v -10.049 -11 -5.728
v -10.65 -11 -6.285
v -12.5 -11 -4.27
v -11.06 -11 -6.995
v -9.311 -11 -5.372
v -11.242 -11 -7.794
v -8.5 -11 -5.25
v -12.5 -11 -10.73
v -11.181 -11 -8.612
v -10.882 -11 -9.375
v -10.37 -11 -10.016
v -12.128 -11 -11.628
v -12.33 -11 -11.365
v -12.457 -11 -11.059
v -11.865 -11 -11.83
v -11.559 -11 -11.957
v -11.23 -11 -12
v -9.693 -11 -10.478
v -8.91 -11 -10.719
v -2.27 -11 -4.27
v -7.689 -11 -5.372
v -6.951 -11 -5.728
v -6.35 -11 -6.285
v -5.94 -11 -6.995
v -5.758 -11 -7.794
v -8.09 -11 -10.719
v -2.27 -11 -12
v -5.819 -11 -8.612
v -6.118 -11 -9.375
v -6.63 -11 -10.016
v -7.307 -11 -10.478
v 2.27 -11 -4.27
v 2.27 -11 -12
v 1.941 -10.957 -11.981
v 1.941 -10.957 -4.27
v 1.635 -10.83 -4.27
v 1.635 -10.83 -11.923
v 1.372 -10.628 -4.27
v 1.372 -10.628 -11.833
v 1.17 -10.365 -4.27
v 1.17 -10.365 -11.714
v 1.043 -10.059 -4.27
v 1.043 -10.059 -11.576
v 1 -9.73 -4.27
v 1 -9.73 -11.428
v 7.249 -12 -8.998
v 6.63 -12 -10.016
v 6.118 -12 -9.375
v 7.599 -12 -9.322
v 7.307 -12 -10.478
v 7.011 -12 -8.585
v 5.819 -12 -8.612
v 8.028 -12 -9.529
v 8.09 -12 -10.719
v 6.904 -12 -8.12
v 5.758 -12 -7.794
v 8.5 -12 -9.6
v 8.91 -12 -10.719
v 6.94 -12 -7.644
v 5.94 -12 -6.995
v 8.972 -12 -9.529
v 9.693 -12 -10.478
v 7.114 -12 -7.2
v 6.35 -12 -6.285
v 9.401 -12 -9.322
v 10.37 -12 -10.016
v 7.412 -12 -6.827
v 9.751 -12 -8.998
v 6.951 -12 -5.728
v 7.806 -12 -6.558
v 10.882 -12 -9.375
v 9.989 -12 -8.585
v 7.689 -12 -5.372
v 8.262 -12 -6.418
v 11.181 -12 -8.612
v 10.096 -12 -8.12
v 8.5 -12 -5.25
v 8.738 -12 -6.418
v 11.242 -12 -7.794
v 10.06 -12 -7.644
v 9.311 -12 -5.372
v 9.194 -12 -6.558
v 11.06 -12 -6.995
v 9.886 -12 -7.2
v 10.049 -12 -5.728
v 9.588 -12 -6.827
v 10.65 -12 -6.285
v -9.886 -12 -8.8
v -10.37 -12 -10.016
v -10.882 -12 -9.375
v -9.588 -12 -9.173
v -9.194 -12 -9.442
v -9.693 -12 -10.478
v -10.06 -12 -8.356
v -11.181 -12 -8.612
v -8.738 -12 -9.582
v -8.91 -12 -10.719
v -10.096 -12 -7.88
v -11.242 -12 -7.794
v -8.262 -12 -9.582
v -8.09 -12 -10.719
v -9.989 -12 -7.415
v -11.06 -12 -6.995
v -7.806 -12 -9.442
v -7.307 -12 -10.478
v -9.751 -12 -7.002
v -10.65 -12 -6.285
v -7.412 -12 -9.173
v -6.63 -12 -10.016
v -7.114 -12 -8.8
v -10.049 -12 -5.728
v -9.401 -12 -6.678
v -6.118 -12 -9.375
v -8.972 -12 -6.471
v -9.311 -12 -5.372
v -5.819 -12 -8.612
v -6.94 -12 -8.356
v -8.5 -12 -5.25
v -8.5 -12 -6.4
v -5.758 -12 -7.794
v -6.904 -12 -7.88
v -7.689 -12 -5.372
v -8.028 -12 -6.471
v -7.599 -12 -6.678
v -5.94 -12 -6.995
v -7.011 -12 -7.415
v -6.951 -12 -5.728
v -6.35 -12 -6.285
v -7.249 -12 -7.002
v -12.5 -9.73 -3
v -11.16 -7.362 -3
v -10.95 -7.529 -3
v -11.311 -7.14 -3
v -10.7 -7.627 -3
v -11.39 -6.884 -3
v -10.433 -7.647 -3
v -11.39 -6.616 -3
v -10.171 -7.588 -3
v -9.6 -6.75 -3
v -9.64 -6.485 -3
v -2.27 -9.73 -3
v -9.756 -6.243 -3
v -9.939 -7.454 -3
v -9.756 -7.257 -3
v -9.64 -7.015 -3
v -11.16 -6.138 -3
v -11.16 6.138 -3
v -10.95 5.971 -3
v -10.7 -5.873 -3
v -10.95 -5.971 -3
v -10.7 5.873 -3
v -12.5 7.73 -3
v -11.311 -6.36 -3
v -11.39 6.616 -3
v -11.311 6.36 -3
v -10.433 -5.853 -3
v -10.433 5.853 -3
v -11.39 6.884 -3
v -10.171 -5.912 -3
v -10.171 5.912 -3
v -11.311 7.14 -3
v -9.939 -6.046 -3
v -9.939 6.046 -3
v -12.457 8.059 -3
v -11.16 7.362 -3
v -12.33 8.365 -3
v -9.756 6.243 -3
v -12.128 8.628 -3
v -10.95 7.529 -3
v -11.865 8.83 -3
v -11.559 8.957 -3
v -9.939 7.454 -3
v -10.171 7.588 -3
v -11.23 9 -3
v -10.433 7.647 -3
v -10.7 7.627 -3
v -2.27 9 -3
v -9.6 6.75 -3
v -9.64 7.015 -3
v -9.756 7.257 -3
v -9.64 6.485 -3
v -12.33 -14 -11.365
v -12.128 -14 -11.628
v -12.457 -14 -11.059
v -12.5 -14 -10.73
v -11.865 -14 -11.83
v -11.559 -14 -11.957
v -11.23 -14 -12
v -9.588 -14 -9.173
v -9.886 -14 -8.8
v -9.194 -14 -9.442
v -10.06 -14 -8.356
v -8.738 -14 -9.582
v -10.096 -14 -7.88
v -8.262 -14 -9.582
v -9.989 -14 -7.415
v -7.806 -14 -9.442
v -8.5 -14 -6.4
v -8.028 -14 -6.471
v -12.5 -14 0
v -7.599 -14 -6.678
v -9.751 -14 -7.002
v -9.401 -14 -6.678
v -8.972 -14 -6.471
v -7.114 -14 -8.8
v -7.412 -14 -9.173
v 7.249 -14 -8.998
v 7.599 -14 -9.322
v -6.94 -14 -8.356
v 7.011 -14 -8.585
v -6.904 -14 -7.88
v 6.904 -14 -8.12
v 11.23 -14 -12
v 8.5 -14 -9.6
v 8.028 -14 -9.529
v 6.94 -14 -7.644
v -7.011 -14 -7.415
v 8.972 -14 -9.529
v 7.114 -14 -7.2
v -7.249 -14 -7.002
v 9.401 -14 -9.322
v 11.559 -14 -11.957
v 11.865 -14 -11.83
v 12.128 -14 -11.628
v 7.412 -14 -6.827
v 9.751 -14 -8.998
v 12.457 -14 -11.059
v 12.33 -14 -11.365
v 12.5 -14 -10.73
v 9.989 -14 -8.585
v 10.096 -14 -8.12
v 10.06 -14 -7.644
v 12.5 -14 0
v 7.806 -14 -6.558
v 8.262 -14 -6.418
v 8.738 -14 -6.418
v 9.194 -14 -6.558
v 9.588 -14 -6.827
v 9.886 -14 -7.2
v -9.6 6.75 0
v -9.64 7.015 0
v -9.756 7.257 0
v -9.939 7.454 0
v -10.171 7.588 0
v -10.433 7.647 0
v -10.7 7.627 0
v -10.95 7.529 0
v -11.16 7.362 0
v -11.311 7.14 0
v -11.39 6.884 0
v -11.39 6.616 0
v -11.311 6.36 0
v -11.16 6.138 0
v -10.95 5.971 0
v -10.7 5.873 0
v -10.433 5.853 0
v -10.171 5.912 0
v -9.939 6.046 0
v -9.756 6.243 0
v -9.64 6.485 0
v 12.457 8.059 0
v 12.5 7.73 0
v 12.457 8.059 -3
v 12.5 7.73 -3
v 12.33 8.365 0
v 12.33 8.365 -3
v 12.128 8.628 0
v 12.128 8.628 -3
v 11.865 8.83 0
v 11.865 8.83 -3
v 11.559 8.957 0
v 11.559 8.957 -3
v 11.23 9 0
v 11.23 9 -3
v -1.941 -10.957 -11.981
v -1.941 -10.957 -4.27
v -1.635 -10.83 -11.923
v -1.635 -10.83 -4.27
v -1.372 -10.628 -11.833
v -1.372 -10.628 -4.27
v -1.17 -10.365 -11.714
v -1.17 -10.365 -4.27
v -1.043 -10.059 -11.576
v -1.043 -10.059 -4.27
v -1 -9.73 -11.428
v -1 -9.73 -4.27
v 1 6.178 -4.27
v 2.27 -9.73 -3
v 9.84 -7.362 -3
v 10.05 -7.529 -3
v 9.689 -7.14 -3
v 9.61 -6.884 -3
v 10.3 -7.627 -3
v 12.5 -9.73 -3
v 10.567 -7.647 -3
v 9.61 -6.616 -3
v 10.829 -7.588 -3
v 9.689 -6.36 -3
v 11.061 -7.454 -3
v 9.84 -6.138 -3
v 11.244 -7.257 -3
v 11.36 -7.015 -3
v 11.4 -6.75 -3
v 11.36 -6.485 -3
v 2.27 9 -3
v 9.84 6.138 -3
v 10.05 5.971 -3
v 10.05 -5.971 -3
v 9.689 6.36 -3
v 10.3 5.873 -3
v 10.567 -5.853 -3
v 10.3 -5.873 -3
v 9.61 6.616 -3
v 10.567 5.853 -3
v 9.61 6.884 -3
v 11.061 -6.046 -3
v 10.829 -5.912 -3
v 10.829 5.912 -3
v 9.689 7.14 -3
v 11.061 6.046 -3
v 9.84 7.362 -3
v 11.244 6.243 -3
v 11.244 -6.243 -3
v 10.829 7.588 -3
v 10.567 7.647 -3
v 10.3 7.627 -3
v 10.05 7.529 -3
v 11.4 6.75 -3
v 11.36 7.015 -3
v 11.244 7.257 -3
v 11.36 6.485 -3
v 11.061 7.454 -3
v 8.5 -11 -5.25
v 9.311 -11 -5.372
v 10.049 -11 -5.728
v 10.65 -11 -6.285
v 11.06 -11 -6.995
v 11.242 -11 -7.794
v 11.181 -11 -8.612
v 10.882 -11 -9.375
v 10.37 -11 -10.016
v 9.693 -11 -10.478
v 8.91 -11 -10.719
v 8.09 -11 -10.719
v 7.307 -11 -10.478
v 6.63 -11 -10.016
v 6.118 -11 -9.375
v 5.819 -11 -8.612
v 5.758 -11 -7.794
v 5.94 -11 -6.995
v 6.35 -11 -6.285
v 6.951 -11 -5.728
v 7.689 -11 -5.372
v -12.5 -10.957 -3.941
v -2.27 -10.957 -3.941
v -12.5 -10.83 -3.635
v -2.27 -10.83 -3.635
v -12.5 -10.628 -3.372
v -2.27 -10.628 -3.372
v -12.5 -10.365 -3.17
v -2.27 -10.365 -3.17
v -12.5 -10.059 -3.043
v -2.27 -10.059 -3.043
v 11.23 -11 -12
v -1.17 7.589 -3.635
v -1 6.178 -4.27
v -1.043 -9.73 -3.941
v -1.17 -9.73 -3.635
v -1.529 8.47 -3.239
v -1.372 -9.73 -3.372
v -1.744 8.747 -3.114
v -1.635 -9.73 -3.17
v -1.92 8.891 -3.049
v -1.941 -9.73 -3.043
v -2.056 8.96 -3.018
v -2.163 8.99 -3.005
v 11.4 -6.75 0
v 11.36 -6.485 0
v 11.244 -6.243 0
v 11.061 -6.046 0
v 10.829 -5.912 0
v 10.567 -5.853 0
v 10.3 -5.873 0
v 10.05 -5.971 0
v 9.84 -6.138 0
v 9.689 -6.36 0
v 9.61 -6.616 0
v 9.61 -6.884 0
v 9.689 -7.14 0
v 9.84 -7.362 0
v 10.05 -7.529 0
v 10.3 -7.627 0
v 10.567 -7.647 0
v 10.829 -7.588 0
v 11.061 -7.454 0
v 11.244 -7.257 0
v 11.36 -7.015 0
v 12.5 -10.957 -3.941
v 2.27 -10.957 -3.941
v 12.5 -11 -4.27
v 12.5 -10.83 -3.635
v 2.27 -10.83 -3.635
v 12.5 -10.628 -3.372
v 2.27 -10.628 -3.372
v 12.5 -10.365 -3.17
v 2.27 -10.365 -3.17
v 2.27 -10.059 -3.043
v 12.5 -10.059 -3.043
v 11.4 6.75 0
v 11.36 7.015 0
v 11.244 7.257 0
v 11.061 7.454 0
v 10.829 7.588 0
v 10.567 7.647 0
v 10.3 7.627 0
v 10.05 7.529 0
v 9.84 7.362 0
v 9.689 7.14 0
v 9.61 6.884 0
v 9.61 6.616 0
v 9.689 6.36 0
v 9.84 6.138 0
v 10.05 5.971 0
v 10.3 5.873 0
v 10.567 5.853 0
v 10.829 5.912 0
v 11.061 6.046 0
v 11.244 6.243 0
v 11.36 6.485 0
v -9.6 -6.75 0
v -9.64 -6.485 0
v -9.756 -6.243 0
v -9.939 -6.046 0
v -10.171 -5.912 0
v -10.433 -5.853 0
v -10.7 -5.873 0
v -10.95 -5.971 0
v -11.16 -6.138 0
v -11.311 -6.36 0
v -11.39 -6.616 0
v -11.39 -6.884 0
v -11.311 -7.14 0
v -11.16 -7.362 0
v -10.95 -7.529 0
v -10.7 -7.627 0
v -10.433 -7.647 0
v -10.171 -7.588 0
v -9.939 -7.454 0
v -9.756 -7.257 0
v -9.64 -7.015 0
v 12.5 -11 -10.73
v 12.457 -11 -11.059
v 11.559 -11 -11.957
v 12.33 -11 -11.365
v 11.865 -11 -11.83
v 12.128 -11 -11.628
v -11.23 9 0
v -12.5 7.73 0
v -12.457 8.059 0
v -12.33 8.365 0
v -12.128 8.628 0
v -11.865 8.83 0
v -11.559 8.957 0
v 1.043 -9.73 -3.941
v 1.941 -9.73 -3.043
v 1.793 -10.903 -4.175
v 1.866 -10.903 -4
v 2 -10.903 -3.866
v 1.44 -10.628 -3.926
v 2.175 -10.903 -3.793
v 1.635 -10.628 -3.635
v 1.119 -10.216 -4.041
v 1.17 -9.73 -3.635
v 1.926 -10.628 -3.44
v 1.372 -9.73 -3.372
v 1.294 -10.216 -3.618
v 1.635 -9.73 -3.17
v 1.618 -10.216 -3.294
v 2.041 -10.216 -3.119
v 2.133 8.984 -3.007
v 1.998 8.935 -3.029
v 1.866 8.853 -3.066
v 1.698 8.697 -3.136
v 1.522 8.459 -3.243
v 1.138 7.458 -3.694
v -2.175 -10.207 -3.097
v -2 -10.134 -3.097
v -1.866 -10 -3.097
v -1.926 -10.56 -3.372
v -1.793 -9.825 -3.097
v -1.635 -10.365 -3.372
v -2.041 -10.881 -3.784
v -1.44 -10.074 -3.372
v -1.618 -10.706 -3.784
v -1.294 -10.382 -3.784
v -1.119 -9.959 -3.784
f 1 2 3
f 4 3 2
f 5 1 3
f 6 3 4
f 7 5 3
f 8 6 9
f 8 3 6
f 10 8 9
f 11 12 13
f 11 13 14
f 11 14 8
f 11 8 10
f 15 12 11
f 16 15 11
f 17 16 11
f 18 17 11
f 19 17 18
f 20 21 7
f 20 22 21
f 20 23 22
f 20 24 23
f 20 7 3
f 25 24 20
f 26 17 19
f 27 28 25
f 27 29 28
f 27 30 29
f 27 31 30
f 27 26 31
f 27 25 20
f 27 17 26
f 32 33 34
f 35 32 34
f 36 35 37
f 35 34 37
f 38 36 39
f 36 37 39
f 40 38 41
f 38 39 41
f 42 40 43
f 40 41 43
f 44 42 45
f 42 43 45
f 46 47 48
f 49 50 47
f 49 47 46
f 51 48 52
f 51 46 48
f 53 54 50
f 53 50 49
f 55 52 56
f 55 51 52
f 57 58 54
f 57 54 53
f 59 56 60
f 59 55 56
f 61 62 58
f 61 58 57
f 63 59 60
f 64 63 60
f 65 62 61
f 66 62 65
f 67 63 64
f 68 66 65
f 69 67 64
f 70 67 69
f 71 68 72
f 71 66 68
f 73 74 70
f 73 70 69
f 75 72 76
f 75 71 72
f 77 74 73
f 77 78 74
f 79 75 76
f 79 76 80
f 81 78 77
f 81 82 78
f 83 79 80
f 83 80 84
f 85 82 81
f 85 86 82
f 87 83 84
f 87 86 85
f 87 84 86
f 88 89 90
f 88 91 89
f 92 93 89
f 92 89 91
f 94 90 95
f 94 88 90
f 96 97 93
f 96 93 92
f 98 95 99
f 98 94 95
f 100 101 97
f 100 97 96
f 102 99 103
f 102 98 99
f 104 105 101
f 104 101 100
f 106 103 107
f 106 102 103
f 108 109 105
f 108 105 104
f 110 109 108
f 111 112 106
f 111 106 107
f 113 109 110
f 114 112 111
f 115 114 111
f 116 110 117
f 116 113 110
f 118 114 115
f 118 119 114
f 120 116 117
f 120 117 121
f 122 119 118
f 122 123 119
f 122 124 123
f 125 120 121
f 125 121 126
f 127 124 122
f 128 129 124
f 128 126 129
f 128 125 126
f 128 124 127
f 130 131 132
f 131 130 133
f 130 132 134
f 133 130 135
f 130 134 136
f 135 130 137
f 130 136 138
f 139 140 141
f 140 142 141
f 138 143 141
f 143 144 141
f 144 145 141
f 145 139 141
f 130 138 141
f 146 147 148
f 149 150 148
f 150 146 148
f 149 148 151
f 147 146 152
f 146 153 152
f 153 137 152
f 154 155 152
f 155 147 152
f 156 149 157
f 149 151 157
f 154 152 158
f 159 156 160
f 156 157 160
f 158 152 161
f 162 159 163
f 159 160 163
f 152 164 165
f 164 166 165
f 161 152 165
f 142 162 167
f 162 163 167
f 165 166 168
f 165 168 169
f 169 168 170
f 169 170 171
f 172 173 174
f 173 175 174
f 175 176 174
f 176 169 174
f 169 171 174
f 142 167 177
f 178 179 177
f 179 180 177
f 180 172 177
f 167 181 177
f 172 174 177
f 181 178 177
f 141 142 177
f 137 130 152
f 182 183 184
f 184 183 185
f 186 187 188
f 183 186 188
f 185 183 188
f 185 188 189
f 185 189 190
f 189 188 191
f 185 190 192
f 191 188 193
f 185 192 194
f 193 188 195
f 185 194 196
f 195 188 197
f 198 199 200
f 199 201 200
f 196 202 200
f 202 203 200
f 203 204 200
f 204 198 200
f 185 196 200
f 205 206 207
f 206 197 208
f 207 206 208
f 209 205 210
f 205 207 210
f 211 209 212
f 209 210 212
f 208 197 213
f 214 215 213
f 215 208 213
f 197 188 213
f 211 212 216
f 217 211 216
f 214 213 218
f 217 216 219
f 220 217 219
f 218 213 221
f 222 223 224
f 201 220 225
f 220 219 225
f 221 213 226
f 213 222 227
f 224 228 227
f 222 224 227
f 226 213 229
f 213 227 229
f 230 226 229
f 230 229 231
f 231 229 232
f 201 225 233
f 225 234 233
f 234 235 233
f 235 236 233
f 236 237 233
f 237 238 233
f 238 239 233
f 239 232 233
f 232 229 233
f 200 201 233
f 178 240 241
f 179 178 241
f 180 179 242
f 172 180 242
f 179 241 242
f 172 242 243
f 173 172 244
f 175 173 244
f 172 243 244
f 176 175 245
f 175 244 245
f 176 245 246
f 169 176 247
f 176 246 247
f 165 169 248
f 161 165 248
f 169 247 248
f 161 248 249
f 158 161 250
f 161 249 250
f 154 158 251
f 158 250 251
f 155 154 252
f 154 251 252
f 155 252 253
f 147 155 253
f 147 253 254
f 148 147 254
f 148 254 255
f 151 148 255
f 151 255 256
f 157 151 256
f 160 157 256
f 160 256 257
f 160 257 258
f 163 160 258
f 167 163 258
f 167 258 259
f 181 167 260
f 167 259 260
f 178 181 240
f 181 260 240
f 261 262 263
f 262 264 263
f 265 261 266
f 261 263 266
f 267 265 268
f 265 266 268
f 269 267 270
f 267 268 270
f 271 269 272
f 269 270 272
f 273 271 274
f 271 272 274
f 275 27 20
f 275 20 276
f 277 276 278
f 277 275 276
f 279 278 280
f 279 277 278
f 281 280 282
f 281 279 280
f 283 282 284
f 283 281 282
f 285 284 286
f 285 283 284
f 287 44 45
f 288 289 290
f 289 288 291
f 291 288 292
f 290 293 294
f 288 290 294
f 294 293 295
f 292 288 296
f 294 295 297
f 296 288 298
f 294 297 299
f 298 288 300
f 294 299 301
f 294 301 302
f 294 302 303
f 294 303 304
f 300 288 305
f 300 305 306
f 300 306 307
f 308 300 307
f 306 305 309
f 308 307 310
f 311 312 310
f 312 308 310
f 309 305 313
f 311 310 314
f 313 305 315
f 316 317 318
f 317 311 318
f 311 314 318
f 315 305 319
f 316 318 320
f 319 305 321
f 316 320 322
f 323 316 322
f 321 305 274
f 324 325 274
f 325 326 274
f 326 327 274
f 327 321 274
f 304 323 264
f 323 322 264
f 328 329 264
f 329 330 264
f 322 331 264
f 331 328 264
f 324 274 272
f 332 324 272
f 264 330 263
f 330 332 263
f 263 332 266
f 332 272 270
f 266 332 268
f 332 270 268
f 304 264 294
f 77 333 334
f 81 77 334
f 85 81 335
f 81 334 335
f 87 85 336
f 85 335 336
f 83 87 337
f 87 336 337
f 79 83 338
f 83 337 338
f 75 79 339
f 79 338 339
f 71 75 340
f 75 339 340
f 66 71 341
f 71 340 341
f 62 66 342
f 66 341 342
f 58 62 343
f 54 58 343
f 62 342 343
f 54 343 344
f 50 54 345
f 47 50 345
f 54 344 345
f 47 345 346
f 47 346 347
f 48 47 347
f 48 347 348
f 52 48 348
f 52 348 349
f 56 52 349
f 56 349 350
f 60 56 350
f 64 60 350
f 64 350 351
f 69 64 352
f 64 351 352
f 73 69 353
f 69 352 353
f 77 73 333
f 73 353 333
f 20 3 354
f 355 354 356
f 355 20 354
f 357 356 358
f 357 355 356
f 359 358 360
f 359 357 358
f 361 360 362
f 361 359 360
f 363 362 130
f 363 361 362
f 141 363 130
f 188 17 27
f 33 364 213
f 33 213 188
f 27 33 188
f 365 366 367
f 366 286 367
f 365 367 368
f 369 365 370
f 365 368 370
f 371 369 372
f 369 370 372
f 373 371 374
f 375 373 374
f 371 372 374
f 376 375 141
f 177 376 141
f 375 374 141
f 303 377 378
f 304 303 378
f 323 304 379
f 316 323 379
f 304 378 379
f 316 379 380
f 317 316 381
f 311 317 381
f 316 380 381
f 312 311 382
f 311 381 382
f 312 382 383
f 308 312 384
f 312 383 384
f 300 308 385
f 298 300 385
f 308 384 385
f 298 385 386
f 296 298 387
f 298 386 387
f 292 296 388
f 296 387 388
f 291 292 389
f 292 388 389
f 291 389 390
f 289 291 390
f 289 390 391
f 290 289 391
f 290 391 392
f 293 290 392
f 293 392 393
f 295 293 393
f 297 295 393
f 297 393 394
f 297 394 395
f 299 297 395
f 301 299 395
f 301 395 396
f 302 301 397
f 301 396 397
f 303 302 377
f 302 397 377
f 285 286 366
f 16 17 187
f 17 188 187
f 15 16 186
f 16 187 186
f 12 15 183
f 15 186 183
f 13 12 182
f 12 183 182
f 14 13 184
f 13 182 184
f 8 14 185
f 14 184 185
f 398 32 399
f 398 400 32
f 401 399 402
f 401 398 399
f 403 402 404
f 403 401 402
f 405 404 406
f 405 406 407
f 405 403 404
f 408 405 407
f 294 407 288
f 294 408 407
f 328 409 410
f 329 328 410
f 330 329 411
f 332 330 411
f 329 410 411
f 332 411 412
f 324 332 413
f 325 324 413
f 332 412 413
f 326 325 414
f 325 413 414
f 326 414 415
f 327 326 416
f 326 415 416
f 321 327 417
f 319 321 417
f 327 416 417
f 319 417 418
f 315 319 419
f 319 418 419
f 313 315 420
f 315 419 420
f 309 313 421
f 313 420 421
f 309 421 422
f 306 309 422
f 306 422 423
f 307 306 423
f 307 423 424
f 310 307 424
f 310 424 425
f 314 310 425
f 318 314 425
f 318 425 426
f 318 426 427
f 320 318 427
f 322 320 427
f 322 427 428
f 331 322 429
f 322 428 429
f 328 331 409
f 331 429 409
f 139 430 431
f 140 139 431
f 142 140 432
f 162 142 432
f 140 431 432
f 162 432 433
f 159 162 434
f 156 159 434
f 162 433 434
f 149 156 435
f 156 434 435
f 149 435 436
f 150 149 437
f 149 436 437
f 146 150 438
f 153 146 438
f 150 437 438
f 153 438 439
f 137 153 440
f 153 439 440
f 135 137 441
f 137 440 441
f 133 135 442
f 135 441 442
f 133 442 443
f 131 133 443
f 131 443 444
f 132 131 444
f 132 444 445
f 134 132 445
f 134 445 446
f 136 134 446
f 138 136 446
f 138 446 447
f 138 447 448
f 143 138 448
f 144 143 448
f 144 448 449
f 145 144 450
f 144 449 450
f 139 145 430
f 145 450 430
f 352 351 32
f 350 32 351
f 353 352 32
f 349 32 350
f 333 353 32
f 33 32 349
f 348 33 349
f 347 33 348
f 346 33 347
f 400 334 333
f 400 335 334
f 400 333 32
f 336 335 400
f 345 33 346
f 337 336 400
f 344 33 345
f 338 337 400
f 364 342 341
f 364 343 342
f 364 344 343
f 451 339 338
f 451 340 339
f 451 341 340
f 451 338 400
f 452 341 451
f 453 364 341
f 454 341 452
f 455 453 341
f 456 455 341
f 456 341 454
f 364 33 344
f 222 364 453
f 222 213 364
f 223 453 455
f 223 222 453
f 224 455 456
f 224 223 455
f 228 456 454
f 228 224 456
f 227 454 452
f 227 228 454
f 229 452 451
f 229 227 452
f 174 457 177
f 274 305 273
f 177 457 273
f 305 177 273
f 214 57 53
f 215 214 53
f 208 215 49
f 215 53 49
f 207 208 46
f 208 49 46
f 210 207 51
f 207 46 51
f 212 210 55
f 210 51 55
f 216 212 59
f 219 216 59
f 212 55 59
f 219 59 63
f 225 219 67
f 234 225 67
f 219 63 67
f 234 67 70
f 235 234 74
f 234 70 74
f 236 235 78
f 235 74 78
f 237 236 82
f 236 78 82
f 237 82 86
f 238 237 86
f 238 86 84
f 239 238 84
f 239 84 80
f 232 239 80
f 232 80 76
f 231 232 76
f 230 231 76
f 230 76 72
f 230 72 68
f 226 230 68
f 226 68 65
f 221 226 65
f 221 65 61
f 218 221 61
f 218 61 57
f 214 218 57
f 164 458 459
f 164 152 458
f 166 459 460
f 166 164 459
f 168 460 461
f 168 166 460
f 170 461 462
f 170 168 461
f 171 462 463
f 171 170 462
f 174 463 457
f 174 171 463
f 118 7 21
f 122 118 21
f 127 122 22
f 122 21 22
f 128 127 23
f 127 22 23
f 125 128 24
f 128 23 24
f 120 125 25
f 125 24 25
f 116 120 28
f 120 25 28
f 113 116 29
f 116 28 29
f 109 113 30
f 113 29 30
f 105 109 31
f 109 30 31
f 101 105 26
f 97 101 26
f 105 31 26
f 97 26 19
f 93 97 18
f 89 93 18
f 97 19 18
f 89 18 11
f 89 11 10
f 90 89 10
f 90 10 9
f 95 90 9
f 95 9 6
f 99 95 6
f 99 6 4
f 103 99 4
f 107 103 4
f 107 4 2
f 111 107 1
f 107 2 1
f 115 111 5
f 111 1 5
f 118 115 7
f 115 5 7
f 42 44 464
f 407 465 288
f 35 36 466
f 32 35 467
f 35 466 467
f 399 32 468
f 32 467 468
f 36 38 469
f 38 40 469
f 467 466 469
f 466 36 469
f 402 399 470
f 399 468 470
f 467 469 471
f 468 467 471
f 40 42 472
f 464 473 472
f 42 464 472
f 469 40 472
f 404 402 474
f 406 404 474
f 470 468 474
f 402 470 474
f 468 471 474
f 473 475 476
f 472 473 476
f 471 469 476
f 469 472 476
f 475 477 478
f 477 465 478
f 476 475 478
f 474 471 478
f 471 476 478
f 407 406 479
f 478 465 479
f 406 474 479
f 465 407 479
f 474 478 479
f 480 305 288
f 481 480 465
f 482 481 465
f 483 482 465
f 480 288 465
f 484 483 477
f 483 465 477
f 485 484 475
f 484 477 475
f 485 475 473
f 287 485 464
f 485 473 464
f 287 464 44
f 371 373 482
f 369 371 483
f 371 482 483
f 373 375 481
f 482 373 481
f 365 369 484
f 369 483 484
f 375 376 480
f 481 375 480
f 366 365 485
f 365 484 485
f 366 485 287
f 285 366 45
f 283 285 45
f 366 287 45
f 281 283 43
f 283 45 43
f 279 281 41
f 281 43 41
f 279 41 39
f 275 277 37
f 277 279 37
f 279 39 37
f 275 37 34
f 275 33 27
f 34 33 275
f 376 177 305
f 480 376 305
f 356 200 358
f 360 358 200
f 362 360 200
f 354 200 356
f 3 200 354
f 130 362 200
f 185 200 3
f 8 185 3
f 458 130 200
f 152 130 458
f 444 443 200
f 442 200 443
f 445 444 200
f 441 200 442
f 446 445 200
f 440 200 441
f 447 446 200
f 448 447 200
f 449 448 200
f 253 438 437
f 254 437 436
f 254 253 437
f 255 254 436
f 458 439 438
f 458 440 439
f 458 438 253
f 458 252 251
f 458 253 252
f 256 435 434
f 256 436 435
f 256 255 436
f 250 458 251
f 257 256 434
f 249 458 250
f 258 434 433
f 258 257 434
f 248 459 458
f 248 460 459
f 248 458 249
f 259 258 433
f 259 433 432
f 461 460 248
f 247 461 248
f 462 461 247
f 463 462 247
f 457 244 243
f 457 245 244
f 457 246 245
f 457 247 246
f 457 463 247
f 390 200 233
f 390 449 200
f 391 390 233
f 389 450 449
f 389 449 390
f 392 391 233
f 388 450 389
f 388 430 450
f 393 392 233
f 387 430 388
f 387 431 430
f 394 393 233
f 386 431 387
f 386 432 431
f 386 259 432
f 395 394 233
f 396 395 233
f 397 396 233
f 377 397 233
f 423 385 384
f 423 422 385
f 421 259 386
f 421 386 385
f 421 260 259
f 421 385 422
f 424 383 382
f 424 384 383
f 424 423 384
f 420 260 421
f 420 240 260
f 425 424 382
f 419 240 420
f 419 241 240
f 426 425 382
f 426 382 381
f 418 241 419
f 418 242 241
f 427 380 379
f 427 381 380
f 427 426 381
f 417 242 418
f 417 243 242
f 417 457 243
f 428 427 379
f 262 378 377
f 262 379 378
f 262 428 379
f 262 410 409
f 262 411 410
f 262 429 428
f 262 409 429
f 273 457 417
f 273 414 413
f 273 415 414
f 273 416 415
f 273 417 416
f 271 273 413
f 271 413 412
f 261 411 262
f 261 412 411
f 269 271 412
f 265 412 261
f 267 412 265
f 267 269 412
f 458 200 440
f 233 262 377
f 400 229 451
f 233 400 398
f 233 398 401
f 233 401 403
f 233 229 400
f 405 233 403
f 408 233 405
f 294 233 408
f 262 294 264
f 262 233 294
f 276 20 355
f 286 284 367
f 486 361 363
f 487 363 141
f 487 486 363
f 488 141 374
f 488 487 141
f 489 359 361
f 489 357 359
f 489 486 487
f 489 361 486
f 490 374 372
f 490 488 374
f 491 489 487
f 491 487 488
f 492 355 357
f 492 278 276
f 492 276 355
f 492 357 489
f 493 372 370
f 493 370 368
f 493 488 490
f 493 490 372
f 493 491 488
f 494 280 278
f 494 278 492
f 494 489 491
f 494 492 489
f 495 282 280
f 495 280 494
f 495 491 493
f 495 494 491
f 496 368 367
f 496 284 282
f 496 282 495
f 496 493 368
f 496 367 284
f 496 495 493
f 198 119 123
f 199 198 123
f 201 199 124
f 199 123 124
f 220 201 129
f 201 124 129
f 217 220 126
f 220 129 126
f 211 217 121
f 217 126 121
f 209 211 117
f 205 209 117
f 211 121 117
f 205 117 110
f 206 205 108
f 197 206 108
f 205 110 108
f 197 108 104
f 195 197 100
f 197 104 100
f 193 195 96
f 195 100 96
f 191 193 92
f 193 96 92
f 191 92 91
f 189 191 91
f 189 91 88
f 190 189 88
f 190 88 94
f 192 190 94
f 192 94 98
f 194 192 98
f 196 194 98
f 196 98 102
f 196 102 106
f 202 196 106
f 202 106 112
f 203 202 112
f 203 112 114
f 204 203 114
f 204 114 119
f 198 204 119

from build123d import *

# Parameters (mm, degrees)
SKETCH1_W                       = 25
SKETCH1_H                       = 23
SKETCH1_R                       = 0.9
BOSS_EXTRUDE1_DEPTH             = 3
BOSS_EXTRUDE2_REACH             = 21.007
BOSS_EXTRUDE2_DIRECTION_2_REACH = 21.007
SKETCH3_W                       = 11.5
SKETCH3_H                       = 9
CUT_EXTRUDE1_DEPTH              = 20
SKETCH4_R                       = 1.6
CUT_EXTRUDE2_DEPTH              = 27.462237245
SKETCH5_R                       = 2.75
CUT_EXTRUDE3_DEPTH              = 1
FILLET2_R                       = 1.27


with BuildPart() as part:
    # Sketch1 → Boss-Extrude1 (new body)
    with BuildSketch(Plane.XY):
        with Locations((0, -2.5)):
            Rectangle(SKETCH1_W, SKETCH1_H)
        with Locations((-10.5, 6.75)):
            Circle(SKETCH1_R, mode=Mode.SUBTRACT)
        with Locations((10.5, 6.75)):
            Circle(SKETCH1_R, mode=Mode.SUBTRACT)
        with Locations((10.5, -6.75)):
            Circle(SKETCH1_R, mode=Mode.SUBTRACT)
        with Locations((-10.5, -6.75)):
            Circle(SKETCH1_R, mode=Mode.SUBTRACT)
    extrude(amount=-BOSS_EXTRUDE1_DEPTH)

    # Boss-Extrude2: up to this face of the body (flat: up to its plane)
    boss_extrude2_end = Plane(part.part.faces().sort_by_distance((12.5, -2.5, -1.5))[0])
    # Sketch2 → Boss-Extrude2 (add, up to the picked face)
    with BuildSketch(Plane(origin=(0, 0, 0), x_dir=(0, 0, -1), z_dir=(1, 0, 0)), mode=Mode.PRIVATE) as boss_extrude2_sk1:
        Polygon((3, 9), (12, -11), (12, -14), (3, -14), align=None)
    boss_extrude2_tool1 = split(extrude(boss_extrude2_sk1.sketch, amount=BOSS_EXTRUDE2_REACH, mode=Mode.PRIVATE), bisect_by=boss_extrude2_end, keep=Keep.BOTH, mode=Mode.PRIVATE)
    add(boss_extrude2_tool1.solids().sort_by(Axis((0, -6.217949, -6.346154), (1, 0, 0)))[0])

    # Boss-Extrude2 direction 2: up to this face of the body (flat: up to its plane)
    boss_extrude2_direction_2_end = Plane(part.part.faces().sort_by_distance((-12.5, -2.5, -1.5))[0])
    # Sketch2 → Boss-Extrude2 direction 2 (add, up to the picked face)
    with BuildSketch(Plane(origin=(0, 0, 0), x_dir=(0, 0, -1), z_dir=(1, 0, 0)), mode=Mode.PRIVATE) as boss_extrude2_direction_2_sk1:
        Polygon((3, 9), (12, -11), (12, -14), (3, -14), align=None)
    boss_extrude2_direction_2_tool1 = split(extrude(boss_extrude2_direction_2_sk1.sketch, amount=-BOSS_EXTRUDE2_DIRECTION_2_REACH, mode=Mode.PRIVATE), bisect_by=boss_extrude2_direction_2_end, keep=Keep.BOTH, mode=Mode.PRIVATE)
    add(boss_extrude2_direction_2_tool1.solids().sort_by(Axis((0, -6.217949, -6.346154), (-1, 0, 0)))[0])

    # Sketch3 → Cut-Extrude1 (cut)
    with BuildSketch(Plane(origin=(0, 9, 0), x_dir=(1, 0, 0), z_dir=(0, 1, 0))):
        with Locations((-6.75, 7.5)):
            Rectangle(SKETCH3_W, SKETCH3_H)
        with Locations((6.75, 7.5)):
            Rectangle(SKETCH3_W, SKETCH3_H)
    extrude(amount=-CUT_EXTRUDE1_DEPTH, mode=Mode.SUBTRACT)

    # Sketch4 → Cut-Extrude2 (cut, through all)
    with BuildSketch(Plane(origin=(0, -11, 0), x_dir=(1, 0, 0), z_dir=(0, 1, 0))):
        with Locations(Location((-8.5, 8, 0), (0, 0, 270))):
            Circle(SKETCH4_R)
        with Locations(Location((8.5, 8, 0), (0, 0, 90))):
            Circle(SKETCH4_R)
    extrude(amount=-CUT_EXTRUDE2_DEPTH, mode=Mode.SUBTRACT)

    # Sketch5 → Cut-Extrude3 (cut)
    with BuildSketch(Plane(origin=(0, -11, 0), x_dir=(1, 0, 0), z_dir=(0, 1, 0))):
        with Locations(Location((-8.5, 8, 0), (0, 0, 270))):
            Circle(SKETCH5_R)
        with Locations(Location((8.5, 8, 0), (0, 0, 270))):
            Circle(SKETCH5_R)
    extrude(amount=-CUT_EXTRUDE3_DEPTH, mode=Mode.SUBTRACT)

    # Fillet2
    fillet2_edges = [part.edges().sort_by_distance(p)[0] for p in [
        (-12.5, -12.5, -12),
        (12.5, -12.5, -12),
        (-1, -11, -7.5),
        (-6.75, -11, -3),
        (-1, -1, -3),
        (1, -1, -3),
        (1, -11, -7.5),
        (6.75, -11, -3),
        (-12.5, 9, -1.5),
        (12.5, 9, -1.5),
    ]]
    fillet(fillet2_edges, radius=FILLET2_R)


solid = part.part
